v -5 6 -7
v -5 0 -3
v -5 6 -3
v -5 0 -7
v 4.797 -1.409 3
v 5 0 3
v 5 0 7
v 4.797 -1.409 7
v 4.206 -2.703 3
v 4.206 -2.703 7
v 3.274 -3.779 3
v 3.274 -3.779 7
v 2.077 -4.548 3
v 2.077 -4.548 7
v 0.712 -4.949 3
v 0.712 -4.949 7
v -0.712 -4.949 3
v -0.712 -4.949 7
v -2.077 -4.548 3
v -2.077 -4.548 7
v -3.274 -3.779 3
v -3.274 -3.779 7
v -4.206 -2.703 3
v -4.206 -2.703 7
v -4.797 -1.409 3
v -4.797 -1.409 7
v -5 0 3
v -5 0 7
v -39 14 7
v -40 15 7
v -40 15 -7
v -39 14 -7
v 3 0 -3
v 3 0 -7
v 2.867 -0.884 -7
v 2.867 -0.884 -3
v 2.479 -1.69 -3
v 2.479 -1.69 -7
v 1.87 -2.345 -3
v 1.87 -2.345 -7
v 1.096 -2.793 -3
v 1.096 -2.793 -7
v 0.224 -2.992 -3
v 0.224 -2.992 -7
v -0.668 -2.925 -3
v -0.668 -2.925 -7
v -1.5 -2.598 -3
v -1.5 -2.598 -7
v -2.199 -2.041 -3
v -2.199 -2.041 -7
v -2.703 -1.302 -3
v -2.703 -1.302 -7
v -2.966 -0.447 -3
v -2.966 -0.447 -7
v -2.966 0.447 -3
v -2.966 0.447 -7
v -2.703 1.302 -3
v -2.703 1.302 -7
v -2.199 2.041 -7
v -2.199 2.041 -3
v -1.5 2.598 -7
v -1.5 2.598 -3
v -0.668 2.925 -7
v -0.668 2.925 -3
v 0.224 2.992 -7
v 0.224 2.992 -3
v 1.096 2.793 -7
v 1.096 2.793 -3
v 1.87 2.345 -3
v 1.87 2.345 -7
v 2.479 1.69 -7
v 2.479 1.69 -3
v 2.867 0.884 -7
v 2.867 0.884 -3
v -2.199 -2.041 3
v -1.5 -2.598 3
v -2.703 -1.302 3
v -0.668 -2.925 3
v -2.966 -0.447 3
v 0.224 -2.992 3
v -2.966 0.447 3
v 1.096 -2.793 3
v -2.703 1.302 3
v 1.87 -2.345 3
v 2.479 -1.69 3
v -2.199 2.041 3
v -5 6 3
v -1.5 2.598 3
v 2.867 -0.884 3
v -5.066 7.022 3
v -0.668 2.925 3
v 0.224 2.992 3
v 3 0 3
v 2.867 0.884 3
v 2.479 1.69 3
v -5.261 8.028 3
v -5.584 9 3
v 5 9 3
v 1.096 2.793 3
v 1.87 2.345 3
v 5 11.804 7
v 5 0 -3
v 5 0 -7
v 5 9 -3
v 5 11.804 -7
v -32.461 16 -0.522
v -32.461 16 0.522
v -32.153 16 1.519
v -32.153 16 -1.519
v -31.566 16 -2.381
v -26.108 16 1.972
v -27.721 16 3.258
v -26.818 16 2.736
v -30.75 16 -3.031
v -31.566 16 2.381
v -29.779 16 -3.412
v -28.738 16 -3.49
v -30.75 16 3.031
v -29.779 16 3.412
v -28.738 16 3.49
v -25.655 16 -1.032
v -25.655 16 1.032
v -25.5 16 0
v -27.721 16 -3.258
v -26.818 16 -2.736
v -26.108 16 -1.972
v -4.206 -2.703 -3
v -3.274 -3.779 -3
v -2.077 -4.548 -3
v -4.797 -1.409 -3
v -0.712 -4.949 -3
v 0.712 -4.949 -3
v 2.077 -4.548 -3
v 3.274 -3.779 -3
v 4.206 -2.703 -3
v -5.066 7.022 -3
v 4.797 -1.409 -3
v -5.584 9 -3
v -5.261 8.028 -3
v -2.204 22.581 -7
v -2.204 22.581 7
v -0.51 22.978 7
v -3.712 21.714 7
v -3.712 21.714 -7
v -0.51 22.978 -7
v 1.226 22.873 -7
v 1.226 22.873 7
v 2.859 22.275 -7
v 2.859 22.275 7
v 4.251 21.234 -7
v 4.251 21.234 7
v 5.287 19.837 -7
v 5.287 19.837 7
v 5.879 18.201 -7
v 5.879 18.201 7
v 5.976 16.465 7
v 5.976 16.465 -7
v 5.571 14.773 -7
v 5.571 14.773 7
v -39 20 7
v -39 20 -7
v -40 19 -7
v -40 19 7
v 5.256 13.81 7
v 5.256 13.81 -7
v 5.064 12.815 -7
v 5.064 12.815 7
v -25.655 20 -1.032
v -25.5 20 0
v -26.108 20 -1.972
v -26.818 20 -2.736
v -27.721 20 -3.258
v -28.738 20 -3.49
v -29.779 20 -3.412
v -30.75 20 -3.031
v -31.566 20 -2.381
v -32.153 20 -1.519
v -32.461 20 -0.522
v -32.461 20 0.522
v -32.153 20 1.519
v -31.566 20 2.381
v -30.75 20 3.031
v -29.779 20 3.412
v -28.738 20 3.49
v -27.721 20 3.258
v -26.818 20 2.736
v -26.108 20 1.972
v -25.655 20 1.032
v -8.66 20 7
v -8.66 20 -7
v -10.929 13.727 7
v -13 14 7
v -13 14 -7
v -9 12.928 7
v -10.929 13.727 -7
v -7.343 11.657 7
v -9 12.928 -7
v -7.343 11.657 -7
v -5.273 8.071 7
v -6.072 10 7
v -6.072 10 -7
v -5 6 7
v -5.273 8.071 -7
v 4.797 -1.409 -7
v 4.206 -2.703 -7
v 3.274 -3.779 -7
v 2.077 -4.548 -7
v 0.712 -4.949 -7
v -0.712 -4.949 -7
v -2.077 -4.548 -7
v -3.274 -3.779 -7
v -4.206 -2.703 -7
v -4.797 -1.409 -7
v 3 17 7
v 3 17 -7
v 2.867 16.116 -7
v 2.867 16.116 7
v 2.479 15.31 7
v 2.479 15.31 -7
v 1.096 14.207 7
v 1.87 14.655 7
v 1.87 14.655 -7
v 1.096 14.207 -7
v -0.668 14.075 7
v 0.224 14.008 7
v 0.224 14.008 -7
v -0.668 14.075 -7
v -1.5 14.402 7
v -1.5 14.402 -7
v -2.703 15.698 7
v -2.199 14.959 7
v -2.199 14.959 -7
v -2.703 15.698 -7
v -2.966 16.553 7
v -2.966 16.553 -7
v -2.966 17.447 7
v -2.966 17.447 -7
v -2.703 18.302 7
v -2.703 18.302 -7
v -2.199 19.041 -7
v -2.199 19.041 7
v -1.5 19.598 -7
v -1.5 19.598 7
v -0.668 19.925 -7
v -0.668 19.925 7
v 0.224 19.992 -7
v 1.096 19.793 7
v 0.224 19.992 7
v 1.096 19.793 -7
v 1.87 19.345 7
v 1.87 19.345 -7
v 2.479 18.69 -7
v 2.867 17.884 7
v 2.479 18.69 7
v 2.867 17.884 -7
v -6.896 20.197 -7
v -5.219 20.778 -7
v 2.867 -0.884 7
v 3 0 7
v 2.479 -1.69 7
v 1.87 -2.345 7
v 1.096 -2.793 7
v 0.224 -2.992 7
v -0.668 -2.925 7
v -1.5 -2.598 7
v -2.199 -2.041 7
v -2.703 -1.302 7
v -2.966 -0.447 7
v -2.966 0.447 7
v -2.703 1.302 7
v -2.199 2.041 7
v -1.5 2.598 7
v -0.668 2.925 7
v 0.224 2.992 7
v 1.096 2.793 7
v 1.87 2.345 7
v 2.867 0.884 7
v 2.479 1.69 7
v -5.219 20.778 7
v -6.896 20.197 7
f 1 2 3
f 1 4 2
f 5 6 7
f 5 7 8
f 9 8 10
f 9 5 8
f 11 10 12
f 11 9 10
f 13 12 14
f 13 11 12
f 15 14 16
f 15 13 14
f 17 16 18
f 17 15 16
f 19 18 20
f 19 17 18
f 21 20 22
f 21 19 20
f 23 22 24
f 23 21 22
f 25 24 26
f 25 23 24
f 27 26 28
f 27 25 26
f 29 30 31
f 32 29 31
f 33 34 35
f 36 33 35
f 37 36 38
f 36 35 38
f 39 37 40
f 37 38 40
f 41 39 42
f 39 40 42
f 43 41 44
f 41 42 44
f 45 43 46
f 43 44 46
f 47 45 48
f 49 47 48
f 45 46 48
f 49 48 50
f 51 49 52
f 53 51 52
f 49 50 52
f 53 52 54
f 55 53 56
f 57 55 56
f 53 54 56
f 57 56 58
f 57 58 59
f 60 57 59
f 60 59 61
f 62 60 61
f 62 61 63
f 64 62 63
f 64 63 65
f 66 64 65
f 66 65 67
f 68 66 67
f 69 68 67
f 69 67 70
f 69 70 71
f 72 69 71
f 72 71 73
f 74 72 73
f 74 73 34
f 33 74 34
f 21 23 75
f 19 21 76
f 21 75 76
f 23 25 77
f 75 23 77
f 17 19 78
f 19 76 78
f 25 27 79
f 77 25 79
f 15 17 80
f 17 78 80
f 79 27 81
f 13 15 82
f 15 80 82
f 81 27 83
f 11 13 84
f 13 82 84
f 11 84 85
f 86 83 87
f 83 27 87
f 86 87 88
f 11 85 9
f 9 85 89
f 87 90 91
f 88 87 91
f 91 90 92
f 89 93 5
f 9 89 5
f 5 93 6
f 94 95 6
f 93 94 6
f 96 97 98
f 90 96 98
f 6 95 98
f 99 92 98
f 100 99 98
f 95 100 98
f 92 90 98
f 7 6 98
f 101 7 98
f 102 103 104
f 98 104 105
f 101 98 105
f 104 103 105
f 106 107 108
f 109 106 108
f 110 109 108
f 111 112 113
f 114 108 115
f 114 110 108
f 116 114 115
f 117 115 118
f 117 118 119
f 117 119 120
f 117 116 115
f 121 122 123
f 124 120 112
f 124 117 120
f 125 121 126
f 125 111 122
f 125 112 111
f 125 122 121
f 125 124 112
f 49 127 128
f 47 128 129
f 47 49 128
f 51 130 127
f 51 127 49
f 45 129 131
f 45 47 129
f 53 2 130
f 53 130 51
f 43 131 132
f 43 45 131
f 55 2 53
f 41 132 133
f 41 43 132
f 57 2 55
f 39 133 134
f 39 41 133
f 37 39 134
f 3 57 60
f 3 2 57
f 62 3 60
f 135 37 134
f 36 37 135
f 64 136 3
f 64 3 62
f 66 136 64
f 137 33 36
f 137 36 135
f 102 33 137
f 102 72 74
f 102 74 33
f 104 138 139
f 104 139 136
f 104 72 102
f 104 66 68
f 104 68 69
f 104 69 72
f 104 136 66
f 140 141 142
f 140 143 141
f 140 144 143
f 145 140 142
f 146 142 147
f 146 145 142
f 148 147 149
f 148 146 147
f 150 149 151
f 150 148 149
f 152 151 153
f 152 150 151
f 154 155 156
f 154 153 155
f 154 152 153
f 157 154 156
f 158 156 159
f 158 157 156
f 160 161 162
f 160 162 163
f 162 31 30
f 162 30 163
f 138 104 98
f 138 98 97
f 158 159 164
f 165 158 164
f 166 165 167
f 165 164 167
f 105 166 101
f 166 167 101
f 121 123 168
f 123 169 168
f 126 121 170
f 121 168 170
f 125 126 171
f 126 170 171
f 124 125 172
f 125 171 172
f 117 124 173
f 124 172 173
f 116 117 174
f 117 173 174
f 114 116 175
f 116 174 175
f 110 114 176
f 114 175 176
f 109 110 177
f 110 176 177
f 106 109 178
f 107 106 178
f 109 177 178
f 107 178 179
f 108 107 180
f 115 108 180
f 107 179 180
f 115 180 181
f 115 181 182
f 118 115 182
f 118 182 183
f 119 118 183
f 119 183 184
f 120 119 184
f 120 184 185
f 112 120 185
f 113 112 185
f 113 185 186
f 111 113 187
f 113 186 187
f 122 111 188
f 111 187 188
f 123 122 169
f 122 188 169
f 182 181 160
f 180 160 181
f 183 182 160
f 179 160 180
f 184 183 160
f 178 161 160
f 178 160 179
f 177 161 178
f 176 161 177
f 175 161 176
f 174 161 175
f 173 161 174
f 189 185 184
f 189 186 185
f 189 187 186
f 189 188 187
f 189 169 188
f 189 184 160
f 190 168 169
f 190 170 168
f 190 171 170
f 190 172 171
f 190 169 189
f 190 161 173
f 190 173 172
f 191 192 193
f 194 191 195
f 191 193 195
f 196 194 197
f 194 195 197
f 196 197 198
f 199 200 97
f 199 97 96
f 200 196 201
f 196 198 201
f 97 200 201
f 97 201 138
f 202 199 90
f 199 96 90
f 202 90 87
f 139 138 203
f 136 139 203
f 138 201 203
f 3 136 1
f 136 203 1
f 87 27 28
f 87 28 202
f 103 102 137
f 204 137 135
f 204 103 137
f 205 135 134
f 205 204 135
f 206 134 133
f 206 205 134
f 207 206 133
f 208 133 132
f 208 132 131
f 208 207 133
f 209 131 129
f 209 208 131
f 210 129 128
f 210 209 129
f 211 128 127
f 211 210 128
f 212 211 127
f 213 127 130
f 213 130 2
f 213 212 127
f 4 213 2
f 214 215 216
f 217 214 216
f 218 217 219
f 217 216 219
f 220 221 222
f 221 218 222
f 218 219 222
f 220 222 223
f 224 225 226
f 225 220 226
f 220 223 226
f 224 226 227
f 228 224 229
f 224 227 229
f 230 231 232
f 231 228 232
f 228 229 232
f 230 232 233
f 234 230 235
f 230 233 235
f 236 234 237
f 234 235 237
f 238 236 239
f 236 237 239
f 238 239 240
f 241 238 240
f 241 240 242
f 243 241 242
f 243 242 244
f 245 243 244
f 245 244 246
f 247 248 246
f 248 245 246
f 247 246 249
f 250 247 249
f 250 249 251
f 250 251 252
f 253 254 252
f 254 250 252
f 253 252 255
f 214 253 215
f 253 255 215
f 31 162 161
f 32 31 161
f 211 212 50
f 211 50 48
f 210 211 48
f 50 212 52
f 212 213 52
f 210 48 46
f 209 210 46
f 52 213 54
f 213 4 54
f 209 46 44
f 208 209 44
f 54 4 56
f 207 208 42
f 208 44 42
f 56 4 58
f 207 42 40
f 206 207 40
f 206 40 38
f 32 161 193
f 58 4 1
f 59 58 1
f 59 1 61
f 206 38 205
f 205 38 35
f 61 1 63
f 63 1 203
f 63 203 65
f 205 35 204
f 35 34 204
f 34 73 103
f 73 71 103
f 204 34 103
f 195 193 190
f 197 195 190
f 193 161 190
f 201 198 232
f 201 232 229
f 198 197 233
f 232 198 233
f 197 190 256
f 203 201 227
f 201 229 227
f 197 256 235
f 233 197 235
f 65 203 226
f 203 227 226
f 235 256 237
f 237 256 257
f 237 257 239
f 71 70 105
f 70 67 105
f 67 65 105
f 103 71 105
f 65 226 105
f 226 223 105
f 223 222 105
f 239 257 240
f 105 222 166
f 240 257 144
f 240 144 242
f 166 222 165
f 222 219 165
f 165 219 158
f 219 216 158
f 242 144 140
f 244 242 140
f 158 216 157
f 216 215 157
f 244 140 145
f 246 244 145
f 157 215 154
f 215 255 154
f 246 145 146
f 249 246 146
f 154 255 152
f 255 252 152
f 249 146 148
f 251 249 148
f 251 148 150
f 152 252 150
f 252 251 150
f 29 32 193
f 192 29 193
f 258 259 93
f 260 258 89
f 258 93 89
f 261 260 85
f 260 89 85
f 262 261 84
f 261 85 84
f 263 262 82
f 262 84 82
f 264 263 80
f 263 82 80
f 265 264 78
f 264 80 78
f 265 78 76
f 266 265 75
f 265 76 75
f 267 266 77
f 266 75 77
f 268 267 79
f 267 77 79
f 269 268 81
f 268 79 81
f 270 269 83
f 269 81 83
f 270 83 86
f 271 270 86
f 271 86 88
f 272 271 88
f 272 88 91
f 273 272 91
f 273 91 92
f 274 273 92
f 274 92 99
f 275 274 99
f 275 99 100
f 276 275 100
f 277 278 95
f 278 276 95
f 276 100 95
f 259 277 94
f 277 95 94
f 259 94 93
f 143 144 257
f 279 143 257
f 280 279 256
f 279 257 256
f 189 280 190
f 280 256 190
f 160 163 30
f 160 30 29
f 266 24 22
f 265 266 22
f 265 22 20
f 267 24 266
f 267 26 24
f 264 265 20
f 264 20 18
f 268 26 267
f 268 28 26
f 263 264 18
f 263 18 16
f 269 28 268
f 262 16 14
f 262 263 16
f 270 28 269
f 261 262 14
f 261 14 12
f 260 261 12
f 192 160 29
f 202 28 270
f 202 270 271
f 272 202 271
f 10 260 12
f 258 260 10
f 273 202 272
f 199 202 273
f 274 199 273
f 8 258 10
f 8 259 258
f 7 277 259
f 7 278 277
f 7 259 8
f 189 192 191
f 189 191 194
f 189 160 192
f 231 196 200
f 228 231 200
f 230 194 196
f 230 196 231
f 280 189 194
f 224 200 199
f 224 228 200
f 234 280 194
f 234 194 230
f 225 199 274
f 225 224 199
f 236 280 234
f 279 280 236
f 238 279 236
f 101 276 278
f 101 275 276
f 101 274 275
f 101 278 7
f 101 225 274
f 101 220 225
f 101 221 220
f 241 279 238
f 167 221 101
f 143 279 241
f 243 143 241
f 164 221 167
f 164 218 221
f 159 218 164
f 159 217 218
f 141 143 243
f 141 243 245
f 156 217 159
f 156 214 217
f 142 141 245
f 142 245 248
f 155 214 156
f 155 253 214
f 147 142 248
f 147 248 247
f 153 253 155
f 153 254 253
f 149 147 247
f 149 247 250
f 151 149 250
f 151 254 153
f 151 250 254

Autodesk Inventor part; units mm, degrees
ref_plane "YZ Plane" through (0, 0, 0) normal (1, 0, 0) x (0, 1, 0)
ref_plane "XZ Plane" through (0, 0, 0) normal (0, 1, 0) x (-1, 0, 0)
ref_plane "XY Plane" through (0, 0, 0) normal (0, 0, 1) x (1, 0, 0)
sketch "스케치1" plane through (0, 0, 0) normal (0, 0, 1) x (1, 0, 0)
  circle A0 centre (0, 0) radius 3
  arc A1 (-5, 0) -> (5, 0) centre (0, 0) ccw
  circle A2 centre (0, 17) radius 3
  line L0 (-5, 0) -> (8.6834, 0) construction
  line L1 (-40, 14) -> (-40, 20)
  line L2 (-40, 20) -> (-5.1962, 20)
  line L3 (5, 0) -> (5, 13.6834)
  line L4 (-40, 14) -> (-5, 14)
  line L5 (-5, 0) -> (-5, 14)
  arc A3 (5, 13.6834) -> (-5.1962, 20) centre (0, 17) ccw
  dimension "d2" = 6
  dimension "d4" = 17
  dimension "d5" = 10
  dimension "d7" = 6
  dimension "d9" = 6
  dimension "d10" = 40
  dimension "d12" = 14
  dimension "d13" = 6
extrude "돌출1" add sketch "스케치1" along normal mid plane 14
chamfer "모따기1" distance 1 angle 45 2 edges at (-40, 20, 0) (-40, 14, 0)
fillet "모깎기1" radius 8 3 edges at (-5, 14, 0) (-5.1962, 20, 0) (5, 13.6834, 0)
sketch "스케치2" plane through (-39, 20, 7) normal (0, 1, 0) x (1, 0, 0)
  circle A0 centre (10, 7) radius 3.5
  line L0 (0, 0) -> (0, 14) projected
  line L1 (30.3397, 0) -> (0, 0) projected
  point P0 (39, 7)
  dimension "d20" = 7
  dimension "d21" = 10
  dimension "d22" = 7
extrude "돌출2" cut sketch "스케치2" against normal blind 4
ref_plane "작업 평면1" through (0, 0, 0) normal (0, 0, 1) x (1, 0, 0)
sketch "스케치3" plane through (0, 0, 0) normal (0, 0, 1) x (1, 0, 0)
  line L0 (15.6771, 9) -> (-15.3905, 9)
  line L1 (-15.3905, 9) -> (-15.3905, -8.77)
  line L2 (-15.3905, -8.77) -> (15.6771, -8.77)
  line L3 (15.6771, -8.77) -> (15.6771, 9)
  arc A0 (-5, 0) -> (5, 0) centre (0, 0) ccw projected
  dimension "d25" = 14
extrude "돌출3" cut sketch "스케치3" along normal mid plane 6
sketch "스케치4" plane through (-39, 20, 7) normal (0, 1, 0) x (1, 0, 0)
  point P0 (39, 7)
properties part number "1번부품"
